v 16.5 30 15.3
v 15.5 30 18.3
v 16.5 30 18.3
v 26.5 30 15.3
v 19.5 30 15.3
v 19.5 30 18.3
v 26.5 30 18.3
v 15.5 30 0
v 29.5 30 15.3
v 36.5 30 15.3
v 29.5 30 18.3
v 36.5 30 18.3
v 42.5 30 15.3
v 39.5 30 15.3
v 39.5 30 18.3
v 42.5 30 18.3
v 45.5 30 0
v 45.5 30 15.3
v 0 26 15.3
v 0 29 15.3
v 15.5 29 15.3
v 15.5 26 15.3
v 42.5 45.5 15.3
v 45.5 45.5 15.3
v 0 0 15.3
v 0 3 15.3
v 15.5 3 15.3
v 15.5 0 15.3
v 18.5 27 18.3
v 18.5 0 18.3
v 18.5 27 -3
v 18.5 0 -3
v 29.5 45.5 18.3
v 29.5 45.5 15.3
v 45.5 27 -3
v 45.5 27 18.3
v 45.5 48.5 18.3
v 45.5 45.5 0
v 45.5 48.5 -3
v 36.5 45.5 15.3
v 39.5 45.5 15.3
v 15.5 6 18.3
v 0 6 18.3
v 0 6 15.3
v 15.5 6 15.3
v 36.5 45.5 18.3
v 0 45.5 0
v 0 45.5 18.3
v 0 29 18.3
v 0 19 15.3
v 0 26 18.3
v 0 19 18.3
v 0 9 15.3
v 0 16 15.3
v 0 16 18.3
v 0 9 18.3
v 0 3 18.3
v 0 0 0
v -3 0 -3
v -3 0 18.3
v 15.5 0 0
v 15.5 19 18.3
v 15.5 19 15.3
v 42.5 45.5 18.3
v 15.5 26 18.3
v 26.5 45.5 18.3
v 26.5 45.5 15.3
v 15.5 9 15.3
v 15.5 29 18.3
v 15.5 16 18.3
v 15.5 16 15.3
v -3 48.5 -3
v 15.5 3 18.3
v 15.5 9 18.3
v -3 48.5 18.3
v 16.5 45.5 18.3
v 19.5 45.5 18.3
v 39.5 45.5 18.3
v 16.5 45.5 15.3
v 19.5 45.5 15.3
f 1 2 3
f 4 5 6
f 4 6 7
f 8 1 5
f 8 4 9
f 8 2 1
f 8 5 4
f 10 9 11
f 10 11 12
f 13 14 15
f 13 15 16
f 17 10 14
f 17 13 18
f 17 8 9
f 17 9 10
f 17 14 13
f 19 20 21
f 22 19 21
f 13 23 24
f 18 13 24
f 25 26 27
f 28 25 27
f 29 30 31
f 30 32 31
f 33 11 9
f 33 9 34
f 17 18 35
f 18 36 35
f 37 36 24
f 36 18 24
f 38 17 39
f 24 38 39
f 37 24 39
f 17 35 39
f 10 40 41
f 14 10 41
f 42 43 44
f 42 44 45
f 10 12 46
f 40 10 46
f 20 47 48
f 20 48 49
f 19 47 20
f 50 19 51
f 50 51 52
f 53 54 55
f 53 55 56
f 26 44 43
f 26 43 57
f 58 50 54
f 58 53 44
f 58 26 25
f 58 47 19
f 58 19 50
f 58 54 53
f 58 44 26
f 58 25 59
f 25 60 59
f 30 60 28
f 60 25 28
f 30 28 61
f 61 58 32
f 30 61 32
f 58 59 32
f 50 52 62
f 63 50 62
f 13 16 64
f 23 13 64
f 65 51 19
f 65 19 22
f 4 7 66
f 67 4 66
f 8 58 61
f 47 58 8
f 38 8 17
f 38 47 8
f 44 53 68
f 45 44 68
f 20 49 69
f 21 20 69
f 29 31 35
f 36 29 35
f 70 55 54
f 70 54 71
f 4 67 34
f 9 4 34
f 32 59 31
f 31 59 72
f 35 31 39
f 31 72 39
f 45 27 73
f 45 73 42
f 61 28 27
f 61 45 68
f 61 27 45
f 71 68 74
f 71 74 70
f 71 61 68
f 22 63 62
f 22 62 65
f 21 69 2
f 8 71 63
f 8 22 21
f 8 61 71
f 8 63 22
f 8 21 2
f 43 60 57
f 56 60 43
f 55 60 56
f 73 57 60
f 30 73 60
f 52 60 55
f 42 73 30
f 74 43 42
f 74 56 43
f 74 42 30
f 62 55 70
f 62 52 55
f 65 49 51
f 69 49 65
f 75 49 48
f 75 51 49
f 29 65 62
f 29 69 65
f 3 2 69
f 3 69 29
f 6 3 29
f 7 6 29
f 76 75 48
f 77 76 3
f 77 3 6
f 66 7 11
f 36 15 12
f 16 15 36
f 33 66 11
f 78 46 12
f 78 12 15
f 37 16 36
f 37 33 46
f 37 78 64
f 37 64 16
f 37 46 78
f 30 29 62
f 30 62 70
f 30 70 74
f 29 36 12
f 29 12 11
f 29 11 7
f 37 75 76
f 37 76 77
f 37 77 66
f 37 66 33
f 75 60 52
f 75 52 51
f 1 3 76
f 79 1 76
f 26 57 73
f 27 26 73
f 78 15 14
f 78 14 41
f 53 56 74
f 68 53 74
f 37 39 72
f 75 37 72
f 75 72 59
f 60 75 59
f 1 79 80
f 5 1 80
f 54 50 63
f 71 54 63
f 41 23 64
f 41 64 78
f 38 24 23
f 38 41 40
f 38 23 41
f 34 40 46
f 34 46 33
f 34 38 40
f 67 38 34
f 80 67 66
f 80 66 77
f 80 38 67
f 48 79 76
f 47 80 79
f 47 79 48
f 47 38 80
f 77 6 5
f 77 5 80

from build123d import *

# Parameters (mm, degrees)
BOSS_EXTRUDE1_DEPTH = 15.3
SHELL1_T            = 3
SKETCH2_W           = 7
SKETCH2_H           = 15.5
SKETCH2_W_2         = 3
SKETCH2_W_3         = 15.5
SKETCH2_H_2         = 7
SKETCH2_H_3         = 3
CUT_EXTRUDE1_DEPTH  = 5


with BuildPart() as part:
    # Sketch1 → Boss-Extrude1 (new body)
    with BuildSketch(Plane.XY):
        Polygon((0, 0), (15.5, 0), (15.5, 30), (45.5, 30), (45.5, 45.5), (0, 45.5), align=None)
    extrude(amount=BOSS_EXTRUDE1_DEPTH)

    # Shell1
    shell1_openings = [part.faces().sort_by_distance(p)[0] for p in [
        (7.75, 0, 7.65),
        (45.5, 37.75, 7.65),
    ]]
    offset(amount=SHELL1_T, openings=shell1_openings, kind=Kind.INTERSECTION)

    # Sketch2 → Cut-Extrude1 (cut)
    with BuildSketch(Plane.XY.offset(18.3)):
        Polygon((15.5, 30), (16.5, 30), (16.5, 45.5), (0, 45.5), (0, 29), (15.5, 29), align=None)
        with Locations((23, 37.75)):
            Rectangle(SKETCH2_W, SKETCH2_H)
        with Locations((33, 37.75)):
            Rectangle(SKETCH2_W, SKETCH2_H)
        with Locations((41, 37.75)):
            Rectangle(SKETCH2_W_2, SKETCH2_H)
        with Locations((7.75, 22.5)):
            Rectangle(SKETCH2_W_3, SKETCH2_H_2)
        with Locations((7.75, 12.5)):
            Rectangle(SKETCH2_W_3, SKETCH2_H_2)
        with Locations((7.75, 4.5)):
            Rectangle(SKETCH2_W_3, SKETCH2_H_3)
    extrude(amount=-CUT_EXTRUDE1_DEPTH, mode=Mode.SUBTRACT)


solid = part.part
